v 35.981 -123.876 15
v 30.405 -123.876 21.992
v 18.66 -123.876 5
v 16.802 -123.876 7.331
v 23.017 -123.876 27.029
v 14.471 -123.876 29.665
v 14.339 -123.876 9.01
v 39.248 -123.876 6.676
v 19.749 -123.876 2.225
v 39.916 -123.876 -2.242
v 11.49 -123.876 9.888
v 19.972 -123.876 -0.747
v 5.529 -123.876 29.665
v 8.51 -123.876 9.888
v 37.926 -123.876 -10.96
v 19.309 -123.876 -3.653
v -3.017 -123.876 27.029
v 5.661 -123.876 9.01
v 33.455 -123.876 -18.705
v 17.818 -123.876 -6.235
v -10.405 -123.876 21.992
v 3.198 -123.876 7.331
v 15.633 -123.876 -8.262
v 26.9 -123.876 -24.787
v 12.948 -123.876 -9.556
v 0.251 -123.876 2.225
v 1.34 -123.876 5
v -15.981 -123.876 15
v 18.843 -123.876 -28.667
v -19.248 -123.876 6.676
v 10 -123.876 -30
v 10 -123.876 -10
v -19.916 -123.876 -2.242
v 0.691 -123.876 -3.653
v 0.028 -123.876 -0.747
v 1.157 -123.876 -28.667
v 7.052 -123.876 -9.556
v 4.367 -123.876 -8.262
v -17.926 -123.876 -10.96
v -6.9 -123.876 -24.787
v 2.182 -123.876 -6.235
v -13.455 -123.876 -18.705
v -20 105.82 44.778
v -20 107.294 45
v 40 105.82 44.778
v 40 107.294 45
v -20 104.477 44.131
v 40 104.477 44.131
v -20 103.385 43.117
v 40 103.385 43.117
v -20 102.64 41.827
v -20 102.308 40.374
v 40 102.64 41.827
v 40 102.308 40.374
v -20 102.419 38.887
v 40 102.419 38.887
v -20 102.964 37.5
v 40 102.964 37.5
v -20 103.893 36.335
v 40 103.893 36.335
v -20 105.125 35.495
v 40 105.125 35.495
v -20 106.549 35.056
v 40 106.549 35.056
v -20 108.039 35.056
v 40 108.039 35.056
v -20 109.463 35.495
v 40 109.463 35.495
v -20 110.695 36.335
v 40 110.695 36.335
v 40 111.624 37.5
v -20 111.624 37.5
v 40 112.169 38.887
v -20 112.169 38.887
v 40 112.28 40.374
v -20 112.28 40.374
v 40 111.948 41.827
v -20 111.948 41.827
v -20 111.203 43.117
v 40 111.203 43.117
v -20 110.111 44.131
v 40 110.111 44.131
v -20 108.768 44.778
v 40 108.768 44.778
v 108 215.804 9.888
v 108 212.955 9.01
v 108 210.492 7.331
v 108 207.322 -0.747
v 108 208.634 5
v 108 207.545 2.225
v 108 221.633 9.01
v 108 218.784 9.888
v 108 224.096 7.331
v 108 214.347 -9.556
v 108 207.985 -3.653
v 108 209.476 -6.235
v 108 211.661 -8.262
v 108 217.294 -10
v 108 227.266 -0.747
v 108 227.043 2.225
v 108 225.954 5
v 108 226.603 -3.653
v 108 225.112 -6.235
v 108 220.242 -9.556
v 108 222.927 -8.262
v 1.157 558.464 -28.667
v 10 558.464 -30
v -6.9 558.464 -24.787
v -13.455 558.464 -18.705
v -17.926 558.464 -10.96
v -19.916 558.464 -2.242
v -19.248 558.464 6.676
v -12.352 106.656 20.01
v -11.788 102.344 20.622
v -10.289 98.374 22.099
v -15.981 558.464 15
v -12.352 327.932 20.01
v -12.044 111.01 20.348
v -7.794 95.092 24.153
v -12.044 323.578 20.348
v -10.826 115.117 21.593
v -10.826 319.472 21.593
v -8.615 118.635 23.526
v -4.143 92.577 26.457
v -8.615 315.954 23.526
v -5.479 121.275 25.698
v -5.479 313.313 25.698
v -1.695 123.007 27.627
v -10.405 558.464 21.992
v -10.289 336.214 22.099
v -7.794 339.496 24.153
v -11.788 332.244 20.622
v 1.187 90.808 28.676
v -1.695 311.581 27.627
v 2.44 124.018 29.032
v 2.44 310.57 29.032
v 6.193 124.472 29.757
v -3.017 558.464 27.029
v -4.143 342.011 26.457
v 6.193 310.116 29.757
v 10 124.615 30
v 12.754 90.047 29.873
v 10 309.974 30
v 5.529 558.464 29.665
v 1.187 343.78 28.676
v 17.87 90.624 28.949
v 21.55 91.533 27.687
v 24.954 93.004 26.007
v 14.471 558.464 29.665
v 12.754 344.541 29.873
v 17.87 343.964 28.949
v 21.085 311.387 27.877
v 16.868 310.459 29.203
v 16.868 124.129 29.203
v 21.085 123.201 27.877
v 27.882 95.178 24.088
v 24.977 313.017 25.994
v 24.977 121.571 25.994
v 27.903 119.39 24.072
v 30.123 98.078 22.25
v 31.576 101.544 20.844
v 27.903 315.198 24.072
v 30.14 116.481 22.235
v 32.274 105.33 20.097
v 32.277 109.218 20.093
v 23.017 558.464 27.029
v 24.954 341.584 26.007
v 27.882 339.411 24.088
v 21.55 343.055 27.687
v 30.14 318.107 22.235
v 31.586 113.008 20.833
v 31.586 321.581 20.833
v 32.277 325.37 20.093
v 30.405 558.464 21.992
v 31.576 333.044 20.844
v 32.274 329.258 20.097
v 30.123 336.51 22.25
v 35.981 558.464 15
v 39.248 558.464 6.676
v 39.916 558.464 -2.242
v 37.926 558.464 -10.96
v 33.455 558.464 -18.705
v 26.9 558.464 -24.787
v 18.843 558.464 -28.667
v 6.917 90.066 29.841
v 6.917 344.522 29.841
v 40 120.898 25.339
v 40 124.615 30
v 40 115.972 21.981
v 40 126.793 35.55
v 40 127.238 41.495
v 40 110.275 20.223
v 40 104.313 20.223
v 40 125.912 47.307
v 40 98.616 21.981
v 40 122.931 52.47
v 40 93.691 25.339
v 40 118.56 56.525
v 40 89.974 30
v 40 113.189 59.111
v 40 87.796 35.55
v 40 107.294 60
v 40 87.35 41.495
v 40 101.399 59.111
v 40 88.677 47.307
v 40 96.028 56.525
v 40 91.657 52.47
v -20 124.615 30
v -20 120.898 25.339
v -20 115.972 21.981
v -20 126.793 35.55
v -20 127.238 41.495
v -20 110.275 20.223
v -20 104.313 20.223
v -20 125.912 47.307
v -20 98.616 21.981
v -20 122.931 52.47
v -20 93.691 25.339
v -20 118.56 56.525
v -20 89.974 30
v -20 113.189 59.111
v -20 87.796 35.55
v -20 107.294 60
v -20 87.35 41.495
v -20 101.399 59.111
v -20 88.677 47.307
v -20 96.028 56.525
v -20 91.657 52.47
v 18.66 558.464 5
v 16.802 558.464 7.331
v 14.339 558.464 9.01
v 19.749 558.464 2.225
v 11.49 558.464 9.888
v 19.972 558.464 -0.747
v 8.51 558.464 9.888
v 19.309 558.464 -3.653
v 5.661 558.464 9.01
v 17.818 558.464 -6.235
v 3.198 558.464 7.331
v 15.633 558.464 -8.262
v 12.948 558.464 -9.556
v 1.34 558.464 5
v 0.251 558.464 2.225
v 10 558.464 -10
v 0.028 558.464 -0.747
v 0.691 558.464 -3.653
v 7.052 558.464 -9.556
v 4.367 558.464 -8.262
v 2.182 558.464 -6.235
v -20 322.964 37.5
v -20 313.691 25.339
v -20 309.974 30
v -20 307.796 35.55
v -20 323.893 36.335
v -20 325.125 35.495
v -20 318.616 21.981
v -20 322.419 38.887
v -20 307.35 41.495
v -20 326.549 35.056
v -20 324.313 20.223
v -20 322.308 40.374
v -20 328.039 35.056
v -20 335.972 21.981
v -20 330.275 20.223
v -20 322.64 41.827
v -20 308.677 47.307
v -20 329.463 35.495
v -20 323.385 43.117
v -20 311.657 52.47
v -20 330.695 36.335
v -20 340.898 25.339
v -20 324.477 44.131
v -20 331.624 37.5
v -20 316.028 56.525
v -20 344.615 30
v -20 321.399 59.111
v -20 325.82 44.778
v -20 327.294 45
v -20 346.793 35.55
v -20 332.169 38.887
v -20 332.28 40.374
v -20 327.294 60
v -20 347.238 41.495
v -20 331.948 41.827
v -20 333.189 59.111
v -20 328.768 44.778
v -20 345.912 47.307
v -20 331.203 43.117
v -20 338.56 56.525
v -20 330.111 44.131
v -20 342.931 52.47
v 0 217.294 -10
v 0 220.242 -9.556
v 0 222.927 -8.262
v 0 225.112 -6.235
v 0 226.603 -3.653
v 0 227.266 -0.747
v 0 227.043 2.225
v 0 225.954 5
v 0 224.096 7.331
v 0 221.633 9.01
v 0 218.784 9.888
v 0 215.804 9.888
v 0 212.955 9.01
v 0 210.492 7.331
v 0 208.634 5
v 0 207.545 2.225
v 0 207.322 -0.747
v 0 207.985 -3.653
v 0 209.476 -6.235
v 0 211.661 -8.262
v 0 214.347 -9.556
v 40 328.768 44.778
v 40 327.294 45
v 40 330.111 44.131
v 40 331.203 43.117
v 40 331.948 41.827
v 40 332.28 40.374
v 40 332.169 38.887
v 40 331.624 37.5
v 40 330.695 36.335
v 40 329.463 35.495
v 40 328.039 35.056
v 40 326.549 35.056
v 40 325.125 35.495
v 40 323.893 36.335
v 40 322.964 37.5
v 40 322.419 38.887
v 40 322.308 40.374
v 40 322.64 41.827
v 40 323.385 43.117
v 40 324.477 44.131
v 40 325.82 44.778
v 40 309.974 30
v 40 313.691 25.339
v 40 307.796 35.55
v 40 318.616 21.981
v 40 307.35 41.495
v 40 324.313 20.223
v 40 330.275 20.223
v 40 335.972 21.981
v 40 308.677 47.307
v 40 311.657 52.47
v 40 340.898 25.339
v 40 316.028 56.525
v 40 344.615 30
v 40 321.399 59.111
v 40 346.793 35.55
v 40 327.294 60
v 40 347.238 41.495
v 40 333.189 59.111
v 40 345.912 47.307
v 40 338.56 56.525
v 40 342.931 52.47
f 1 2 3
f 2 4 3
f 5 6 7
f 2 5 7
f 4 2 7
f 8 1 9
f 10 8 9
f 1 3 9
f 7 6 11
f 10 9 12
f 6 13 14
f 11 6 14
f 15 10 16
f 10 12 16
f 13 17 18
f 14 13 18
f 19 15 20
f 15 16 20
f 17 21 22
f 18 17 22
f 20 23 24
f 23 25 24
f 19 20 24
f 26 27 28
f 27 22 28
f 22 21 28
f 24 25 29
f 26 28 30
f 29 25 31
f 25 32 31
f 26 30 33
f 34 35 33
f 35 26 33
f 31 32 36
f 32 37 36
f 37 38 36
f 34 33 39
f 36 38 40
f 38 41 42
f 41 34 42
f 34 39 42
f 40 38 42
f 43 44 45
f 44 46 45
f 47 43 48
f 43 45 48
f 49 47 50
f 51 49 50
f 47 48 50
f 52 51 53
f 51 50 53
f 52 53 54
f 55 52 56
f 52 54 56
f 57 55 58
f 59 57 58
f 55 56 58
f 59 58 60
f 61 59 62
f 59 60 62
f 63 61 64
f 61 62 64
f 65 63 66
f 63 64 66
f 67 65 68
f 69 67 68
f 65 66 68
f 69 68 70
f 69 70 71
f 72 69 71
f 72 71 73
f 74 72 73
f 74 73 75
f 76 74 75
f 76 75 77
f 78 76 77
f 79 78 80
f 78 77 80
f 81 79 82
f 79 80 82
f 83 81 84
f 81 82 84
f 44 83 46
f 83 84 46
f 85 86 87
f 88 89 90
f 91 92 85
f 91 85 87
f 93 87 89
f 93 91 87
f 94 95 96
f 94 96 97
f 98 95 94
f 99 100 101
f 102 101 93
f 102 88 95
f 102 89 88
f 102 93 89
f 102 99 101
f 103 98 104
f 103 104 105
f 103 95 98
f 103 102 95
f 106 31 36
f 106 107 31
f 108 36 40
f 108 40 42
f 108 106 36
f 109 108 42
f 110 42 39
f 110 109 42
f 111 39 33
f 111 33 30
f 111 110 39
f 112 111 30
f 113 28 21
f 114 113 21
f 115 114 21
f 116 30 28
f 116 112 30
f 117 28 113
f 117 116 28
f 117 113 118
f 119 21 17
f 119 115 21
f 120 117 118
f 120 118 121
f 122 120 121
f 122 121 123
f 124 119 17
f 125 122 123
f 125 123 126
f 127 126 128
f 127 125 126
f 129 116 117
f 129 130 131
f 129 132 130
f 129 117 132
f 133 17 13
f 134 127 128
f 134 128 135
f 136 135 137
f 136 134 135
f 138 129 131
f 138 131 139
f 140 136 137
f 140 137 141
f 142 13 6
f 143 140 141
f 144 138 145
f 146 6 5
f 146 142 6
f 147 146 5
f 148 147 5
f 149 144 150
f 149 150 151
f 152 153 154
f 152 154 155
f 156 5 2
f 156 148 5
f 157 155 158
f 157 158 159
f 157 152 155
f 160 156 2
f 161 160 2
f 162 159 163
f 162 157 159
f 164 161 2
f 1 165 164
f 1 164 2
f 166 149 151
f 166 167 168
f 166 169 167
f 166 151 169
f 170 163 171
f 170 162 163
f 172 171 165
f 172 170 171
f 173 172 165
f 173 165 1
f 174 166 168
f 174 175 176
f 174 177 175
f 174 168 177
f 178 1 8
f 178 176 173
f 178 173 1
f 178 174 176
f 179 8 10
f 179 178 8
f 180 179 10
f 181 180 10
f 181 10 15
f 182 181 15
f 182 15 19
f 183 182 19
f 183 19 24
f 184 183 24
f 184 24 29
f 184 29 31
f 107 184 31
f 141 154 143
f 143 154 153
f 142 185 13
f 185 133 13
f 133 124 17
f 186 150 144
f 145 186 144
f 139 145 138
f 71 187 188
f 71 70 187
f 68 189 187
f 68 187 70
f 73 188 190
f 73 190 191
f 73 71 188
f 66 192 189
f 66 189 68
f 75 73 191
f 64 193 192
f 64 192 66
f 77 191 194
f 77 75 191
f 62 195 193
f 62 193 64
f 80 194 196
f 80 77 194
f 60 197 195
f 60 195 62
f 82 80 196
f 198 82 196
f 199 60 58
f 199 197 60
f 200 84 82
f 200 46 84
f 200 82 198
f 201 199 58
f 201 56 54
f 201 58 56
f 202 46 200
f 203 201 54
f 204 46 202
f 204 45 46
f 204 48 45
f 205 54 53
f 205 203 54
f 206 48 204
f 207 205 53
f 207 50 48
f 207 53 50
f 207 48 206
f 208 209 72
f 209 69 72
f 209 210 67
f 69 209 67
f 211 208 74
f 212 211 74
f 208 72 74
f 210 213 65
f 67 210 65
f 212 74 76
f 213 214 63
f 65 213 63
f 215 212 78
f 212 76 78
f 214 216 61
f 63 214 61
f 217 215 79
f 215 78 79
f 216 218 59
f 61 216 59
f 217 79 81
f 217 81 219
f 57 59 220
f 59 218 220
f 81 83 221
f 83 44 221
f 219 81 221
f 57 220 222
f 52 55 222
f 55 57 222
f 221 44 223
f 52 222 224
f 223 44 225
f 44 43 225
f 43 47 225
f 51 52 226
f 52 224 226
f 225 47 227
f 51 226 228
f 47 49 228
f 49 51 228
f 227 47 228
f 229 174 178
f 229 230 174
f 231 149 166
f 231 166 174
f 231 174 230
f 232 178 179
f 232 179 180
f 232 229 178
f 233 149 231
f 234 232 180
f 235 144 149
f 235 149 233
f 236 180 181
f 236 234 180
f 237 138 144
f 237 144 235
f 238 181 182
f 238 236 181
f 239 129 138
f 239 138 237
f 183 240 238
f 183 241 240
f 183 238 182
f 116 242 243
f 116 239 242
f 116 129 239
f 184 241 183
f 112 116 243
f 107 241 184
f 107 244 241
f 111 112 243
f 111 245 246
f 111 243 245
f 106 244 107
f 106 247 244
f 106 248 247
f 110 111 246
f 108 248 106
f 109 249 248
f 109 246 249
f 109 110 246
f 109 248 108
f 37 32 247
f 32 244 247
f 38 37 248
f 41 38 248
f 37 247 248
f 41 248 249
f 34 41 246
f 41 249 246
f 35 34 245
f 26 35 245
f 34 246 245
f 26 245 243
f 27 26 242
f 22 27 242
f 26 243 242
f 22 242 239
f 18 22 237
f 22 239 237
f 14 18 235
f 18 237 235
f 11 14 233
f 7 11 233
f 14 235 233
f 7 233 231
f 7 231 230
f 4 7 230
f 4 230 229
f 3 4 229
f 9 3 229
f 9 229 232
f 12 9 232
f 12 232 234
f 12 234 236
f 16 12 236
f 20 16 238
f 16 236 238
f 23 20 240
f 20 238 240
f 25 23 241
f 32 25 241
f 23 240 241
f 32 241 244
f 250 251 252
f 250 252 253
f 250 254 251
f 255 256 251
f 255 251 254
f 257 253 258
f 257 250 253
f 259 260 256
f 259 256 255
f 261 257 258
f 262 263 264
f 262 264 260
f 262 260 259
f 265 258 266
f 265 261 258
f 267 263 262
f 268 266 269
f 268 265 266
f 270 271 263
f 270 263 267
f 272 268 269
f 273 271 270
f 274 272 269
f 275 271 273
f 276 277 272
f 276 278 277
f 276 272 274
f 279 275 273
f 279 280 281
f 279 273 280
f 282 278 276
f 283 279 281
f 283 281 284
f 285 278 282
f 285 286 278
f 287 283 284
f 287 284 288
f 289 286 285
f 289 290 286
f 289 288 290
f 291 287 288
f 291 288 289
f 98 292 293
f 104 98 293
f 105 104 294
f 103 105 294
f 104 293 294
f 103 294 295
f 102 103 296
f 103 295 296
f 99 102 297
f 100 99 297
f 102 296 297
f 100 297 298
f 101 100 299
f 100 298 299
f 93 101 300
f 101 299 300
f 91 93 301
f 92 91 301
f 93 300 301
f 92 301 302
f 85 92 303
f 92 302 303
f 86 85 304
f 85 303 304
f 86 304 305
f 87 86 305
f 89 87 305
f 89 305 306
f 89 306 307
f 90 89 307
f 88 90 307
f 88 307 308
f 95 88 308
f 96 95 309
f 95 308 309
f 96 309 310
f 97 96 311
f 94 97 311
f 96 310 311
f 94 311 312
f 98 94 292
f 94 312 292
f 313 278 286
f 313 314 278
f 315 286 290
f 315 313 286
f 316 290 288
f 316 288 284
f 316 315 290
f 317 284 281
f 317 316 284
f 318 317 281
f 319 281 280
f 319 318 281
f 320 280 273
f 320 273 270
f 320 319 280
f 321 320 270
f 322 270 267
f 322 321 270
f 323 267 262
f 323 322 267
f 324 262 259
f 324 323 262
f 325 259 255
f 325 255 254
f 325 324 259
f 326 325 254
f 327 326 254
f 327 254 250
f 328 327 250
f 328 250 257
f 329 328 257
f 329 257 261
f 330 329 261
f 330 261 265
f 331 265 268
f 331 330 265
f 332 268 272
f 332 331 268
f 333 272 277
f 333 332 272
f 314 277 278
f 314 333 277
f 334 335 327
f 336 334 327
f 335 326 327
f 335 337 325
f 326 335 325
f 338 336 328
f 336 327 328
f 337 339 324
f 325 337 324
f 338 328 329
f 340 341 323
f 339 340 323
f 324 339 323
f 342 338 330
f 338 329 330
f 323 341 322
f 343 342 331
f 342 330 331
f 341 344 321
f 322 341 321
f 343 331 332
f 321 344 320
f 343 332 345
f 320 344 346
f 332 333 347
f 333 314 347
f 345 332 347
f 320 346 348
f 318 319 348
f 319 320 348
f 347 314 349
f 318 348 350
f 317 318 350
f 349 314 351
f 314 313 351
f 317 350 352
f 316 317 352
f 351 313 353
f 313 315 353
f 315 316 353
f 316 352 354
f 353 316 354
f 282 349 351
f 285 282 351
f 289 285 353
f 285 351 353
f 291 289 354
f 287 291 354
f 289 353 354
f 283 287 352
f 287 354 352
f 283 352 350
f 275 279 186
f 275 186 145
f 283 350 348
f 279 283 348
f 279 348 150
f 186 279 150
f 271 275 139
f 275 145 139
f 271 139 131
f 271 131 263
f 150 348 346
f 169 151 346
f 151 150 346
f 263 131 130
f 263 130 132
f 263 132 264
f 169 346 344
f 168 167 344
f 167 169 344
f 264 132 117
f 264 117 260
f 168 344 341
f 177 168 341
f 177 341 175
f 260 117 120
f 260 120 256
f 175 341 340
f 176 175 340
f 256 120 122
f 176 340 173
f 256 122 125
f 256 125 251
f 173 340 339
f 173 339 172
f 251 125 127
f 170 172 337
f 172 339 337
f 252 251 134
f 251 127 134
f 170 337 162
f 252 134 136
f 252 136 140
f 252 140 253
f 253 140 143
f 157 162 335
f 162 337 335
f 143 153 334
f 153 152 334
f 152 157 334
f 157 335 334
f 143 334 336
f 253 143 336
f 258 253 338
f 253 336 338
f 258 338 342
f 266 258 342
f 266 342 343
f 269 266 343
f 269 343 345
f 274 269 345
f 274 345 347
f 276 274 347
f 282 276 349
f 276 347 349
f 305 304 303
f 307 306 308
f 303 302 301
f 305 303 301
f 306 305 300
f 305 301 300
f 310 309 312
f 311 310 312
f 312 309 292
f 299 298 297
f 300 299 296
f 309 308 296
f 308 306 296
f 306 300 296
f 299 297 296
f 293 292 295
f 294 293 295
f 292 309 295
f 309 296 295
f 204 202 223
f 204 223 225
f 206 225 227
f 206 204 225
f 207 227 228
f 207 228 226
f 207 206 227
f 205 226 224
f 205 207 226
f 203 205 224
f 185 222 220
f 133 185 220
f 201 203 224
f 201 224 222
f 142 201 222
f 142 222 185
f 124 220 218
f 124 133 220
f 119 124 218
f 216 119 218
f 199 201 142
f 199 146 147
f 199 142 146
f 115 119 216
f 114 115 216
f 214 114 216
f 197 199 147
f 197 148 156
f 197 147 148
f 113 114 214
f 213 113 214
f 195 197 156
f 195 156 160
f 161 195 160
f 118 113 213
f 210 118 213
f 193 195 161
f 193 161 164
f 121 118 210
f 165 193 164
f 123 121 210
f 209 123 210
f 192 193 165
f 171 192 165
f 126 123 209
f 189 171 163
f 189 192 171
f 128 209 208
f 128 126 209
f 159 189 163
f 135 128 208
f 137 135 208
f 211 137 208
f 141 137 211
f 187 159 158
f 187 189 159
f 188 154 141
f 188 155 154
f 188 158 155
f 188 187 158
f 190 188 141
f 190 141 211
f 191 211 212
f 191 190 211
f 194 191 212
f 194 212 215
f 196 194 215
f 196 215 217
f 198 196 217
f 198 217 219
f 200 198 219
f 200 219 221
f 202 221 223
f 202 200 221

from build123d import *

# Parameters (mm, degrees)
SZKIC1_W                    = 20
SZKIC1_H                    = 682.34
SZKIC4_W                    = 60
SZKIC4_H                    = 15
SZKIC5_R                    = 10
DODANIE_WYCI_GNI_CIE1_DEPTH = 108


with BuildPart() as part:
    # Szkic1 → Obrót1 (revolve)
    with BuildSketch(Plane.XY):
        with Locations((-10, 217.294070703)):
            Rectangle(SZKIC1_W, SZKIC1_H)
    revolve(axis=Axis((10, 0, 0), (0, 1, 0)))

    # Szkic4 → Obrót2 (revolve)
    with BuildSketch(Plane.XY.offset(40)):
        with Locations((10, 94.794070703)):
            Rectangle(SZKIC4_W, SZKIC4_H)
    obr_t2 = revolve(axis=Axis((0, 107.294070703, 40), (1, 0, 0)))

    # Lustro1: Obrót2 across plane
    add(obr_t2.mirror(Plane(origin=(0, 217.294070703, 0), x_dir=(0, 0, 1), z_dir=(0, -1, 0))))


with BuildPart() as body_2:
    # Szkic5 → Dodanie-wyciągnięcie1 (new body)
    with BuildSketch(Plane(origin=(0, 0, 0), x_dir=(0, 0, -1), z_dir=(1, 0, 0))):
        with Locations((0, 217.294070703)):
            Circle(SZKIC5_R)
    extrude(amount=DODANIE_WYCI_GNI_CIE1_DEPTH)


solid = Compound([part.part, body_2.part])
